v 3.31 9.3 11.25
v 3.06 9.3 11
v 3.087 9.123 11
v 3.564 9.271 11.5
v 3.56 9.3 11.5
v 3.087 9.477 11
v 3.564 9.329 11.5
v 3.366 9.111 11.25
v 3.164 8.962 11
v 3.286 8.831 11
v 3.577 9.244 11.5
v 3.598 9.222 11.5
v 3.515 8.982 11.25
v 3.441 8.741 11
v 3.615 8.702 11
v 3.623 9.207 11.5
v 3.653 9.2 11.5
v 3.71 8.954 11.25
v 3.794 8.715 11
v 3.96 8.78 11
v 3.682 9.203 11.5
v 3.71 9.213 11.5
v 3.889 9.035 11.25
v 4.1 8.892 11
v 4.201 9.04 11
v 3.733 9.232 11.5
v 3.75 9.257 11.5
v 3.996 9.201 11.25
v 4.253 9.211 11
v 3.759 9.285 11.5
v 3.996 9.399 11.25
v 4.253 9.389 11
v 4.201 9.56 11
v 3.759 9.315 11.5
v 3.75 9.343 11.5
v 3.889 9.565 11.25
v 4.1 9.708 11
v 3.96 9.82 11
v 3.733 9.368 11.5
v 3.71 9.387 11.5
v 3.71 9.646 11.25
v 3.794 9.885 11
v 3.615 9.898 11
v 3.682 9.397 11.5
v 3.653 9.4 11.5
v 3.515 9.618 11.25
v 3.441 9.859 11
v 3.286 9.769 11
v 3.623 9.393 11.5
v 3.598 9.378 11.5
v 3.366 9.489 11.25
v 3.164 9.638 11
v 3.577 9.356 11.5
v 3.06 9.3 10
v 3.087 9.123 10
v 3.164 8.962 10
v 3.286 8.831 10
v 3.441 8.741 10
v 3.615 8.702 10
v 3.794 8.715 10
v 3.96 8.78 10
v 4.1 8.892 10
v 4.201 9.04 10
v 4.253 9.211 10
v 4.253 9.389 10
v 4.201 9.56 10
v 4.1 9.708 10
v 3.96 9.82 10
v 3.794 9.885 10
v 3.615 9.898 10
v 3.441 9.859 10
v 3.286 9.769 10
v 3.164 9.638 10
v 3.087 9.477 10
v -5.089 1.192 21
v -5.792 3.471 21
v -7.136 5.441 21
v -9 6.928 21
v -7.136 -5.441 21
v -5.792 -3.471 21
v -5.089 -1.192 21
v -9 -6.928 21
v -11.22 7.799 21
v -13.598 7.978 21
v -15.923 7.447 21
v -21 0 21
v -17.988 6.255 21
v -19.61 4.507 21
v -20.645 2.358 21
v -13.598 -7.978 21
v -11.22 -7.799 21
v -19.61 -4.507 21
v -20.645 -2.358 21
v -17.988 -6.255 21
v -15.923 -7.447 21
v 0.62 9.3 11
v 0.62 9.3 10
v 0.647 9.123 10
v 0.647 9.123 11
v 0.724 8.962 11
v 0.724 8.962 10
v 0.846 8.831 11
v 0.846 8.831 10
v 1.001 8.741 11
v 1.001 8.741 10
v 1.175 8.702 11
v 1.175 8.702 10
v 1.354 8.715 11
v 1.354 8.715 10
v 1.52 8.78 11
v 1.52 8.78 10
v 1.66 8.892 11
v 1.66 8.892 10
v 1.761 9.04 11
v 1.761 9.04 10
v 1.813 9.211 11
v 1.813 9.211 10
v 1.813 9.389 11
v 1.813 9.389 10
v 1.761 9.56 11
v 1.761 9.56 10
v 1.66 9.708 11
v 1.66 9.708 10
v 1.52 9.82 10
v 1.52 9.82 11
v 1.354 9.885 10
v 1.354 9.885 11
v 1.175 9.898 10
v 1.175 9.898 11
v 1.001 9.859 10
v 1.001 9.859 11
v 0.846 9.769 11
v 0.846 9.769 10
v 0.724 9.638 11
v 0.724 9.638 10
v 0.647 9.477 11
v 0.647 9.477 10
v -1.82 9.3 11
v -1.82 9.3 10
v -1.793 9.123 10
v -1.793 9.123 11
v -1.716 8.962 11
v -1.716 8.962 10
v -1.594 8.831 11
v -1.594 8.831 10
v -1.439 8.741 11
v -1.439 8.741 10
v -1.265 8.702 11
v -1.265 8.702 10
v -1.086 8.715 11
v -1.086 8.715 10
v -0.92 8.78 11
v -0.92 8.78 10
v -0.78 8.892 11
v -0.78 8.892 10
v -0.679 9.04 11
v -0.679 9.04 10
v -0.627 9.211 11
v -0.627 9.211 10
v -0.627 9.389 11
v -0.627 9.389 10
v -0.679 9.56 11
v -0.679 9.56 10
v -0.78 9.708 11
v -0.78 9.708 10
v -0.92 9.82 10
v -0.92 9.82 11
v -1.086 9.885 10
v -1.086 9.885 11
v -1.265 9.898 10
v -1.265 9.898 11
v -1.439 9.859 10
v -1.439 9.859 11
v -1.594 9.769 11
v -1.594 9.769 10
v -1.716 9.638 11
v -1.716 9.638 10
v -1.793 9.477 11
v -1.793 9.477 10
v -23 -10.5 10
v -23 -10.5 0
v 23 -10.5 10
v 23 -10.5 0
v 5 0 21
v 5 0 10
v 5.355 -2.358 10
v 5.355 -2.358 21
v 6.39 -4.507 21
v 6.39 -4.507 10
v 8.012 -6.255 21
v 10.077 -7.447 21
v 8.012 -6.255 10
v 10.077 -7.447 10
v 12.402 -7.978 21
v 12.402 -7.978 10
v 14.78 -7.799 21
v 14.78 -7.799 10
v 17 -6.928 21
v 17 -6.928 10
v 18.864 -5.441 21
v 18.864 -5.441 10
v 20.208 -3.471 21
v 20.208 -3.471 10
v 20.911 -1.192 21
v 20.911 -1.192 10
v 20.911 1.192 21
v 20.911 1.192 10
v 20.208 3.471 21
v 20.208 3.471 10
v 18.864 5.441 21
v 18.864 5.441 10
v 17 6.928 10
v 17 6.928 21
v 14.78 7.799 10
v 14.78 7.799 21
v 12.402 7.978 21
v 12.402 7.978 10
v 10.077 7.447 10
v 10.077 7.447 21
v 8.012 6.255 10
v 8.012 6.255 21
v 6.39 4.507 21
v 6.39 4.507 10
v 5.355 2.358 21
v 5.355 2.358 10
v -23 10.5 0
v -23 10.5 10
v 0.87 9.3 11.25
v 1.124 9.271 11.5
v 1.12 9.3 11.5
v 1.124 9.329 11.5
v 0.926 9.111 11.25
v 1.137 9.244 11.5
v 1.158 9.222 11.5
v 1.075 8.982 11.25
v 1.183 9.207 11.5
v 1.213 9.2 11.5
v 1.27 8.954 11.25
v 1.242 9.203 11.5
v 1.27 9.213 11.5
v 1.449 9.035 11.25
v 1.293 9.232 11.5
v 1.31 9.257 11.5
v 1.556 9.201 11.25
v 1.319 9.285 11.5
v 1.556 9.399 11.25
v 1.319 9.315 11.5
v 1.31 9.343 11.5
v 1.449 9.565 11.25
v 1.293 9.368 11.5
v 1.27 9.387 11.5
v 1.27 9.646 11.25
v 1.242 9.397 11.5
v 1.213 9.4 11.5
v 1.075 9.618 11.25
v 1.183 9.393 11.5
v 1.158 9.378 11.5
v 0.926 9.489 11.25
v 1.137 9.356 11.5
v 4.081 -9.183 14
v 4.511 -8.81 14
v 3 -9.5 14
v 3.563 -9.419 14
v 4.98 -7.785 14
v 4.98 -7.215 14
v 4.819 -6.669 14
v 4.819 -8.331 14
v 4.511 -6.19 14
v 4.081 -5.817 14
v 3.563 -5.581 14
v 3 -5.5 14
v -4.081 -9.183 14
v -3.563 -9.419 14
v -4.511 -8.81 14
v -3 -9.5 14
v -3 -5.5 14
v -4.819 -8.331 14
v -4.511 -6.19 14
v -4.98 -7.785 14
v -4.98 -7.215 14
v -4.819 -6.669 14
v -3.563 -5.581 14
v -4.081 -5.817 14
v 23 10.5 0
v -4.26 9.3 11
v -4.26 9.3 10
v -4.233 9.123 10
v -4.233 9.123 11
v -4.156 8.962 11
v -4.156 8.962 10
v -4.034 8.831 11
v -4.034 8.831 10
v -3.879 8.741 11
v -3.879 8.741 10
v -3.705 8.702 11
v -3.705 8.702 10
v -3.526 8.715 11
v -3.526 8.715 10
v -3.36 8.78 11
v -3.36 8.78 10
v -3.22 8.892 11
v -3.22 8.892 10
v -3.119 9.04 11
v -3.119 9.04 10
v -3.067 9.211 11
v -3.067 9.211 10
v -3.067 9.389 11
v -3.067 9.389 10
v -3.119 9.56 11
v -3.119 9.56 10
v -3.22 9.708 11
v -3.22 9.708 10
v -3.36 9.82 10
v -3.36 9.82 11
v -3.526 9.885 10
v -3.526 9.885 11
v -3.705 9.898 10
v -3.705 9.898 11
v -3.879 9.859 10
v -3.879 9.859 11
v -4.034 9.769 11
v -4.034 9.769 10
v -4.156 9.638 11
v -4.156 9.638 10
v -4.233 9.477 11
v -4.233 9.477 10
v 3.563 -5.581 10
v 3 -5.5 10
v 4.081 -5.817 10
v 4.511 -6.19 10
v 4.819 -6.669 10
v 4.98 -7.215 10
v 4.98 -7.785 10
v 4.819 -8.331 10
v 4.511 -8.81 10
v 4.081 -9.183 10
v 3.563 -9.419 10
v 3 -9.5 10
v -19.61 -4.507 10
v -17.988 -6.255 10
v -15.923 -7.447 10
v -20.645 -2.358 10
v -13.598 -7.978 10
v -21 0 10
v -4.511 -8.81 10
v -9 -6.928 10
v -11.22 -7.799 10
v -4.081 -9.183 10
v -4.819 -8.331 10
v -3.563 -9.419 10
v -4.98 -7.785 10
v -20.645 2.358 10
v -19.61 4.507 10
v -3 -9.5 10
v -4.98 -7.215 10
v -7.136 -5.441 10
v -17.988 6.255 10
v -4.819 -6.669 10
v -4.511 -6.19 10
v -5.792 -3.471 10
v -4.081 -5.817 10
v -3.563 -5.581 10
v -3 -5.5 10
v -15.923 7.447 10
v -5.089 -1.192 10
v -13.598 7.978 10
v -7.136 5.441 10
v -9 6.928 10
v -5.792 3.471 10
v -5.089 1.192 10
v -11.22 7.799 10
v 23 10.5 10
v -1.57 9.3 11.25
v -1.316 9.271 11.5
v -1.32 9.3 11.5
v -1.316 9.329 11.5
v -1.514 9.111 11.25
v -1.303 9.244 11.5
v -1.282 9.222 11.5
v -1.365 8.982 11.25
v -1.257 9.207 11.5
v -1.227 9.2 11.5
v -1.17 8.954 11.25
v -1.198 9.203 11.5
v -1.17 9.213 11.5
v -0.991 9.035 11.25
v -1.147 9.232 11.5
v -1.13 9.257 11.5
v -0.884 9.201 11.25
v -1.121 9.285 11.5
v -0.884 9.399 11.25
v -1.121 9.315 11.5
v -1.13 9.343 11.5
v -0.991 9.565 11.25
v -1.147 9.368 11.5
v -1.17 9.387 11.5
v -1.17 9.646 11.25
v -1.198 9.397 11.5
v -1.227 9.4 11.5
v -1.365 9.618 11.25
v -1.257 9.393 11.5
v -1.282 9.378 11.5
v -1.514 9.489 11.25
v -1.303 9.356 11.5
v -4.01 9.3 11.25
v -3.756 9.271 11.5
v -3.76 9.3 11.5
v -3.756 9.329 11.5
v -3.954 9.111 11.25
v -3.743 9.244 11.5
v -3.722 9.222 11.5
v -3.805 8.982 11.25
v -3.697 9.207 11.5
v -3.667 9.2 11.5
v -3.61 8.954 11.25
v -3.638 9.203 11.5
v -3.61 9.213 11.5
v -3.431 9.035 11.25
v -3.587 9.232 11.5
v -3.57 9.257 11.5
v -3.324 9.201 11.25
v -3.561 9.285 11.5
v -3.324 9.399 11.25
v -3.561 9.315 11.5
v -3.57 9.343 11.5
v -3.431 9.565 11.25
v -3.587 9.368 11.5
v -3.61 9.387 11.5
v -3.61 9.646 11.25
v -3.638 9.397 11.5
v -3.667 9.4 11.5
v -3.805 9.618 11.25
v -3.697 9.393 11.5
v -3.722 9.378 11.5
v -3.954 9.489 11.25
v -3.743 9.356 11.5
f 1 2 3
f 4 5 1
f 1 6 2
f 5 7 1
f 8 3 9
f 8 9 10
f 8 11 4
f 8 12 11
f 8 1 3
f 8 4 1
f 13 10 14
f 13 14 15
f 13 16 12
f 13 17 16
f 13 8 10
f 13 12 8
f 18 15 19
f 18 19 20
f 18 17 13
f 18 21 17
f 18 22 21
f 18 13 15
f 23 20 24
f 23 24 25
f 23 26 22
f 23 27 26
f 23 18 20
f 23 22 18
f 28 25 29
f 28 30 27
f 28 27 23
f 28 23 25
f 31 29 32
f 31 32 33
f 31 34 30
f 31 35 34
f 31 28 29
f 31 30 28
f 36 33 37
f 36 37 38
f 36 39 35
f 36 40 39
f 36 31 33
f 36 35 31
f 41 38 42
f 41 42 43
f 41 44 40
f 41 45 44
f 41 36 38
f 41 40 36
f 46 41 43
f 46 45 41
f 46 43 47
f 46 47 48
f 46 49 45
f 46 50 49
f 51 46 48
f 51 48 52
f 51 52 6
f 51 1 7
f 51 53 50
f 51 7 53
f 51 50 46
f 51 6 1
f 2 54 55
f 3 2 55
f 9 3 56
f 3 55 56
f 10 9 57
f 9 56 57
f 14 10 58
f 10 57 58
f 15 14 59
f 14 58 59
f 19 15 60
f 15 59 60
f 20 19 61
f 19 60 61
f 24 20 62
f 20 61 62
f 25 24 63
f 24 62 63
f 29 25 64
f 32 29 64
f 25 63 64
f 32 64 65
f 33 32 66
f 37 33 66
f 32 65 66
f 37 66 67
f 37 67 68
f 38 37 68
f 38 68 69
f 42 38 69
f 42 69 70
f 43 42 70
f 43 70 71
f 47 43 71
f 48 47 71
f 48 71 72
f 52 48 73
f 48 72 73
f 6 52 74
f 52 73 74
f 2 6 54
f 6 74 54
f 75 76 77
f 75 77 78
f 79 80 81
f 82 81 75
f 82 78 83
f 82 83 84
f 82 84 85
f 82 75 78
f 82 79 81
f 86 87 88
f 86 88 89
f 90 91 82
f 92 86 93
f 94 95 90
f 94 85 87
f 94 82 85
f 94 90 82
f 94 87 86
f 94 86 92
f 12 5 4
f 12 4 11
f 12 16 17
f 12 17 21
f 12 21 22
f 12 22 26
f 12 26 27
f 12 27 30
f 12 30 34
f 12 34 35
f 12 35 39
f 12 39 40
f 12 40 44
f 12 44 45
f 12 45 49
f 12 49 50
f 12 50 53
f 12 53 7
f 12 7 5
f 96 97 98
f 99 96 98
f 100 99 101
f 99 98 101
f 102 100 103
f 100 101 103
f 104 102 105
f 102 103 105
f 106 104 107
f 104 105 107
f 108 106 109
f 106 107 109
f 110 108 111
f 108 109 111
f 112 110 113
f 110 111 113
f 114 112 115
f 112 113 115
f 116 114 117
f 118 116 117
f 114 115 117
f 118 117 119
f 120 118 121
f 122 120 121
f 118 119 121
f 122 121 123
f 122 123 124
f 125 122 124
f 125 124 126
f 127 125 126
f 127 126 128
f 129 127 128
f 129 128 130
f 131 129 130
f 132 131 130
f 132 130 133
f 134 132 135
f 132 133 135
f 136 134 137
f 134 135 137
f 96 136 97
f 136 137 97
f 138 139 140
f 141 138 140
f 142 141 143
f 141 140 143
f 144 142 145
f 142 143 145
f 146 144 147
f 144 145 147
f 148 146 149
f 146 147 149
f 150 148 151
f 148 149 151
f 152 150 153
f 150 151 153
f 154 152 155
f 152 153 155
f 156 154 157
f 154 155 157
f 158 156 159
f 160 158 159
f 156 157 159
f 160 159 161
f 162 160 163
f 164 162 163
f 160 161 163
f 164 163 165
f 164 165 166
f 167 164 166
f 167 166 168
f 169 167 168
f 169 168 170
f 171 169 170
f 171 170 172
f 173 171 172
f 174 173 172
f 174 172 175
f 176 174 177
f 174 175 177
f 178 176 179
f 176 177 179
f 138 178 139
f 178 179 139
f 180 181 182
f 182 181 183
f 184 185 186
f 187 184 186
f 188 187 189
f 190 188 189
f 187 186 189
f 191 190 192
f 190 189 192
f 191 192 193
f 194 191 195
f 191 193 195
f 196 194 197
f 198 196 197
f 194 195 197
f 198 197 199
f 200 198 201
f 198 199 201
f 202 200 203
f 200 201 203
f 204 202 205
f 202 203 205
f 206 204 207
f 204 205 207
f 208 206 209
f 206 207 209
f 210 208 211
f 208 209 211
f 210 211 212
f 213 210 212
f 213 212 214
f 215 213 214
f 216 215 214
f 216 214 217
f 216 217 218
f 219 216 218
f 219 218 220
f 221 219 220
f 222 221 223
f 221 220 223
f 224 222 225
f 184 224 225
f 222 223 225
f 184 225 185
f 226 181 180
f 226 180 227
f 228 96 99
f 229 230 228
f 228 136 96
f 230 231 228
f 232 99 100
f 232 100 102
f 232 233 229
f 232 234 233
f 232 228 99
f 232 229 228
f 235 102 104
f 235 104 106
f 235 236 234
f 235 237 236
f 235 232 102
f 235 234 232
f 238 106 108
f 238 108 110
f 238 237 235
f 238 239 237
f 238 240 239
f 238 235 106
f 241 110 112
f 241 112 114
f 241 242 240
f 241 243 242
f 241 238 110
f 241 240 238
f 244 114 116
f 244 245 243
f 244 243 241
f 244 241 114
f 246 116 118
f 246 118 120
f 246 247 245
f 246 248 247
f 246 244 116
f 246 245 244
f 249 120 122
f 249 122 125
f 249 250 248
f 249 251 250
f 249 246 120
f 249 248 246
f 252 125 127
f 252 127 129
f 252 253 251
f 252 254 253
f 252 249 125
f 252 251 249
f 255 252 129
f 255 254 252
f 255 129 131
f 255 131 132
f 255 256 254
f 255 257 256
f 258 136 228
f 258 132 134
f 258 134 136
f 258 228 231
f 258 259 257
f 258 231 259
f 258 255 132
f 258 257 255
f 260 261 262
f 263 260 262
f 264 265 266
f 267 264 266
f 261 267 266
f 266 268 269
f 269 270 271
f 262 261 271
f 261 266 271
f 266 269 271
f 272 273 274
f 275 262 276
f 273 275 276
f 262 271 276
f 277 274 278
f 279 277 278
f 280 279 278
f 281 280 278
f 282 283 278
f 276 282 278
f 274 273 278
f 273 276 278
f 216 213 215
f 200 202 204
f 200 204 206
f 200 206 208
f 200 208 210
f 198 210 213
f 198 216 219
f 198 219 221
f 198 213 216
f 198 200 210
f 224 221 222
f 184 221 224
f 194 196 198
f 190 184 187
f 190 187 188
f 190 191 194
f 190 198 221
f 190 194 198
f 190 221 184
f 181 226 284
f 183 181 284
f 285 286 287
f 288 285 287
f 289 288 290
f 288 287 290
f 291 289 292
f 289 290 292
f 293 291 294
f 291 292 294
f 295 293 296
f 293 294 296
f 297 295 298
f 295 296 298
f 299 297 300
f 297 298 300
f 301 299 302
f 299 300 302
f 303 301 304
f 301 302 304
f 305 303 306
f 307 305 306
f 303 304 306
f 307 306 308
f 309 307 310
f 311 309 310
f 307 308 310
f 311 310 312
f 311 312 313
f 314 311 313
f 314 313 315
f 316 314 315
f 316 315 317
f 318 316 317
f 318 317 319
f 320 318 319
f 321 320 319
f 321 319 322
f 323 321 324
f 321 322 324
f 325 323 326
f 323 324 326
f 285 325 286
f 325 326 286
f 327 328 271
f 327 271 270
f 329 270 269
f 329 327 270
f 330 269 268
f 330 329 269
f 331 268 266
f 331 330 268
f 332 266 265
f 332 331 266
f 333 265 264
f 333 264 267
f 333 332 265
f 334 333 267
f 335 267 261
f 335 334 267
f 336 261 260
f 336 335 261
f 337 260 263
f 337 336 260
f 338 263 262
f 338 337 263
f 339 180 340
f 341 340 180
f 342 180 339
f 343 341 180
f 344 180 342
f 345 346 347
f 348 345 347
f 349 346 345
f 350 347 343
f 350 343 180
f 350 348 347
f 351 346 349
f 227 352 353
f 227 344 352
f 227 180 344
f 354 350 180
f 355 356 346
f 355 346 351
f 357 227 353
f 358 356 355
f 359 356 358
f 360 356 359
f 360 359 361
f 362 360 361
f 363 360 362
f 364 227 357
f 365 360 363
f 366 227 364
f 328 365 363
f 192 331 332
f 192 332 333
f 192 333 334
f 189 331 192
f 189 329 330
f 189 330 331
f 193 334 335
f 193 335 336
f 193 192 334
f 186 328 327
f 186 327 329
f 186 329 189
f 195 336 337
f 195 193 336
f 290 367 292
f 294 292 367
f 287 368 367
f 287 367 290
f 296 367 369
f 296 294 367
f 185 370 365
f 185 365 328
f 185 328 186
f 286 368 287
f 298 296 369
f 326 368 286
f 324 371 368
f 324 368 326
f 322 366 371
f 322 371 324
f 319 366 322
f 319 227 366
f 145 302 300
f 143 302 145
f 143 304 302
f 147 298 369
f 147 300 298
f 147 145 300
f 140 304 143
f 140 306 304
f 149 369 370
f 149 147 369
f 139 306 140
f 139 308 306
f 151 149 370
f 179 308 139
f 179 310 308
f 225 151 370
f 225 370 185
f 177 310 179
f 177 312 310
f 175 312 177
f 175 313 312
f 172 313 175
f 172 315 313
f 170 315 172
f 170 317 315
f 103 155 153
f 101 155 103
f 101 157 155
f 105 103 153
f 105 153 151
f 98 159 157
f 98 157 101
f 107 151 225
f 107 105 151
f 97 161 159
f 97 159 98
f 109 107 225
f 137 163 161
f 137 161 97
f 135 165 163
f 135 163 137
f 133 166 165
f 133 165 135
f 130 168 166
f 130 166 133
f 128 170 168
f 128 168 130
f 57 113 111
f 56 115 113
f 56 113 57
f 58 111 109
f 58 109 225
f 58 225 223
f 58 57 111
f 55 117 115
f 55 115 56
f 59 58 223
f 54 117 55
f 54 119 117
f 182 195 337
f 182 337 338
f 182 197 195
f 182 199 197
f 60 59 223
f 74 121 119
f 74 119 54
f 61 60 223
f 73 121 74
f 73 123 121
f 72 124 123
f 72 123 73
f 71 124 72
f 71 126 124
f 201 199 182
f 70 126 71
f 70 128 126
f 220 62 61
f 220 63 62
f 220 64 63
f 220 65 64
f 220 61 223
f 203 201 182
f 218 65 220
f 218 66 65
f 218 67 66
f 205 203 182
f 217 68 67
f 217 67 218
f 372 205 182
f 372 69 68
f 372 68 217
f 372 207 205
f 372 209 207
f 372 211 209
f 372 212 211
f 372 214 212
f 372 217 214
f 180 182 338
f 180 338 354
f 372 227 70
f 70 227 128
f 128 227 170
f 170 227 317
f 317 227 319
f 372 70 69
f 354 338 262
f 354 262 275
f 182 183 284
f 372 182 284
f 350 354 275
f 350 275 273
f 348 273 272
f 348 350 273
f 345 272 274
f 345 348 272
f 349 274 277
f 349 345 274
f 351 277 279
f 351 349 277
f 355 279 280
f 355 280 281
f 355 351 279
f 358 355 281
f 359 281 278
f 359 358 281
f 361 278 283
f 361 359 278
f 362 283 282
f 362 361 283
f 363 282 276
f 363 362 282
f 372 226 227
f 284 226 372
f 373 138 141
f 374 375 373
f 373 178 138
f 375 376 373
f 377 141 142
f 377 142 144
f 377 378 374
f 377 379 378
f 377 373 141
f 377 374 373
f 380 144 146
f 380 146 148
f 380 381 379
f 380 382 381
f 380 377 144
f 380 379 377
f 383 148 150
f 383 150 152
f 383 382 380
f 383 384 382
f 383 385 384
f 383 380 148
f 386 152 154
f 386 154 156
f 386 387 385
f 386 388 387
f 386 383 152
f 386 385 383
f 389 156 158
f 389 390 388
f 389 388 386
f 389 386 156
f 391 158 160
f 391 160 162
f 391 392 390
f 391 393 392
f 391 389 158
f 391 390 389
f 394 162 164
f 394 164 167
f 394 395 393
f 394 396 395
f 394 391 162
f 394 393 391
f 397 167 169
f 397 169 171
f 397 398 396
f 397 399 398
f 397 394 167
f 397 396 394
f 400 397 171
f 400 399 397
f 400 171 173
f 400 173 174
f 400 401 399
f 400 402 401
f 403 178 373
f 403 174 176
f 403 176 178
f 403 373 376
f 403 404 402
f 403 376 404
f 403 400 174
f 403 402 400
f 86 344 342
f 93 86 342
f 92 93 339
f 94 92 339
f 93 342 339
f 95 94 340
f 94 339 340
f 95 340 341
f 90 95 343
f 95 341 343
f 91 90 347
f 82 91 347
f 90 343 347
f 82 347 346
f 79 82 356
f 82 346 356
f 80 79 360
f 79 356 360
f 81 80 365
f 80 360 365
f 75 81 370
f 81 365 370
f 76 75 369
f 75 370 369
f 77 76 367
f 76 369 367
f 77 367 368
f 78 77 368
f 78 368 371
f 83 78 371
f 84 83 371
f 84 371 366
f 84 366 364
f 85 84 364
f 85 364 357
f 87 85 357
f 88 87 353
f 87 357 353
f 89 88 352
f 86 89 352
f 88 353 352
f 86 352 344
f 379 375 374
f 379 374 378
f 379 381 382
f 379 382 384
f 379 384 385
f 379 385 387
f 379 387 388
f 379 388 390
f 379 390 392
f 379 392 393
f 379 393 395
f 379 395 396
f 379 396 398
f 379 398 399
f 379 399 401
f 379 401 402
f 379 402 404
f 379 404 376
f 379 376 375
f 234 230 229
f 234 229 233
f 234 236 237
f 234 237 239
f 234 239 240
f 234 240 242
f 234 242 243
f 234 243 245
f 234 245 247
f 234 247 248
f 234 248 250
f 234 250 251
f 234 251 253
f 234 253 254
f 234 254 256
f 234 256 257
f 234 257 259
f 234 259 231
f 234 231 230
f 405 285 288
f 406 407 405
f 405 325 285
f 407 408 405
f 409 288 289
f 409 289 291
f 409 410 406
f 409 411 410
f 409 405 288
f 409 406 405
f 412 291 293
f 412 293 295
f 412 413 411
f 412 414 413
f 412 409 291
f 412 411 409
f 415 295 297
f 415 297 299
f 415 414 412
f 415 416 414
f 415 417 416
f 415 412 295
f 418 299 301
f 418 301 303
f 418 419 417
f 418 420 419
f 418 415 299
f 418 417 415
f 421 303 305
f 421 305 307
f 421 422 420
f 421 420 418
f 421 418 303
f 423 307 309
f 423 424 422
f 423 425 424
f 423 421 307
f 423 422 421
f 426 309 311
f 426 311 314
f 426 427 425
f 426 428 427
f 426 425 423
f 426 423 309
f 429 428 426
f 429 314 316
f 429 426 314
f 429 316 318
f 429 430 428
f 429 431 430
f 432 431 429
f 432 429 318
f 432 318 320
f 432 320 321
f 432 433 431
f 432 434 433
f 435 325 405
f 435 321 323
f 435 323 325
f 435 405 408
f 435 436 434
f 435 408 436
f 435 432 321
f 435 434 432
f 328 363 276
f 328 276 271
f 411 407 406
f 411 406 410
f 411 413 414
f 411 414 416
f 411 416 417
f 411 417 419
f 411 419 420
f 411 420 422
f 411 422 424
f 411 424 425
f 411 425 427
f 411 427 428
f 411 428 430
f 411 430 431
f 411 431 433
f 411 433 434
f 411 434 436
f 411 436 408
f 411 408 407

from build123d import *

# Parameters (mm, degrees)
SZKIC1_W                    = 46
SZKIC1_H                    = 21
DODANIE_WYCI_GNI_CIE1_DEPTH = 10
SZKIC2_R                    = 8
DODANIE_WYCI_GNI_CIE2_DEPTH = 11
DODANIE_WYCI_GNI_CIE3_DEPTH = 4
SZKIC4_R                    = 0.6
DODANIE_WYCI_GNI_CIE4_DEPTH = 1.5
SFAZOWANIE1_SIZE            = 0.5


with BuildPart() as part:
    # Szkic1 → Dodanie-wyciągnięcie1 (new body)
    with BuildSketch(Plane.XY):
        Rectangle(SZKIC1_W, SZKIC1_H)
    extrude(amount=DODANIE_WYCI_GNI_CIE1_DEPTH)

    # Szkic2 → Dodanie-wyciągnięcie2 (add)
    with BuildSketch(Plane.XY.offset(10)):
        with Locations(Location((-13, 0, 0), (0, 0, 180))):
            Circle(SZKIC2_R)
        with Locations(Location((13, 0, 0), (0, 0, 180))):
            Circle(SZKIC2_R)
    extrude(amount=DODANIE_WYCI_GNI_CIE2_DEPTH)

    # Szkic3 → Dodanie-wyciągnięcie3 (add)
    with BuildSketch(Plane.XY.offset(10)):
        with BuildLine():
            Line((-3, -5.5), (3, -5.5))
            ThreePointArc((3, -5.5), (5, -7.5), (3, -9.5))
            Line((3, -9.5), (-3, -9.5))
            ThreePointArc((-3, -9.5), (-5, -7.5), (-3, -5.5))
        make_face()
    extrude(amount=DODANIE_WYCI_GNI_CIE3_DEPTH)

    # Szkic4 → Dodanie-wyciągnięcie4 (add)
    with BuildSketch(Plane.XY.offset(10)):
        with Locations(Location((-3.66, 9.3, 0), (0, 0, 180))):
            Circle(SZKIC4_R)
        with Locations(Location((-1.22, 9.3, 0), (0, 0, 180))):
            Circle(SZKIC4_R)
        with Locations(Location((3.66, 9.3, 0), (0, 0, 180))):
            Circle(SZKIC4_R)
        with Locations(Location((1.22, 9.3, 0), (0, 0, 180))):
            Circle(SZKIC4_R)
    extrude(amount=DODANIE_WYCI_GNI_CIE4_DEPTH)

    # Sfazowanie1
    sfazowanie1_edges = [part.edges().sort_by_distance(p)[0] for p in [
        (-3.06, 9.3, 11.5),
        (-0.62, 9.3, 11.5),
        (4.26, 9.3, 11.5),
        (1.82, 9.3, 11.5),
    ]]
    chamfer(sfazowanie1_edges, length=SFAZOWANIE1_SIZE)


solid = part.part
